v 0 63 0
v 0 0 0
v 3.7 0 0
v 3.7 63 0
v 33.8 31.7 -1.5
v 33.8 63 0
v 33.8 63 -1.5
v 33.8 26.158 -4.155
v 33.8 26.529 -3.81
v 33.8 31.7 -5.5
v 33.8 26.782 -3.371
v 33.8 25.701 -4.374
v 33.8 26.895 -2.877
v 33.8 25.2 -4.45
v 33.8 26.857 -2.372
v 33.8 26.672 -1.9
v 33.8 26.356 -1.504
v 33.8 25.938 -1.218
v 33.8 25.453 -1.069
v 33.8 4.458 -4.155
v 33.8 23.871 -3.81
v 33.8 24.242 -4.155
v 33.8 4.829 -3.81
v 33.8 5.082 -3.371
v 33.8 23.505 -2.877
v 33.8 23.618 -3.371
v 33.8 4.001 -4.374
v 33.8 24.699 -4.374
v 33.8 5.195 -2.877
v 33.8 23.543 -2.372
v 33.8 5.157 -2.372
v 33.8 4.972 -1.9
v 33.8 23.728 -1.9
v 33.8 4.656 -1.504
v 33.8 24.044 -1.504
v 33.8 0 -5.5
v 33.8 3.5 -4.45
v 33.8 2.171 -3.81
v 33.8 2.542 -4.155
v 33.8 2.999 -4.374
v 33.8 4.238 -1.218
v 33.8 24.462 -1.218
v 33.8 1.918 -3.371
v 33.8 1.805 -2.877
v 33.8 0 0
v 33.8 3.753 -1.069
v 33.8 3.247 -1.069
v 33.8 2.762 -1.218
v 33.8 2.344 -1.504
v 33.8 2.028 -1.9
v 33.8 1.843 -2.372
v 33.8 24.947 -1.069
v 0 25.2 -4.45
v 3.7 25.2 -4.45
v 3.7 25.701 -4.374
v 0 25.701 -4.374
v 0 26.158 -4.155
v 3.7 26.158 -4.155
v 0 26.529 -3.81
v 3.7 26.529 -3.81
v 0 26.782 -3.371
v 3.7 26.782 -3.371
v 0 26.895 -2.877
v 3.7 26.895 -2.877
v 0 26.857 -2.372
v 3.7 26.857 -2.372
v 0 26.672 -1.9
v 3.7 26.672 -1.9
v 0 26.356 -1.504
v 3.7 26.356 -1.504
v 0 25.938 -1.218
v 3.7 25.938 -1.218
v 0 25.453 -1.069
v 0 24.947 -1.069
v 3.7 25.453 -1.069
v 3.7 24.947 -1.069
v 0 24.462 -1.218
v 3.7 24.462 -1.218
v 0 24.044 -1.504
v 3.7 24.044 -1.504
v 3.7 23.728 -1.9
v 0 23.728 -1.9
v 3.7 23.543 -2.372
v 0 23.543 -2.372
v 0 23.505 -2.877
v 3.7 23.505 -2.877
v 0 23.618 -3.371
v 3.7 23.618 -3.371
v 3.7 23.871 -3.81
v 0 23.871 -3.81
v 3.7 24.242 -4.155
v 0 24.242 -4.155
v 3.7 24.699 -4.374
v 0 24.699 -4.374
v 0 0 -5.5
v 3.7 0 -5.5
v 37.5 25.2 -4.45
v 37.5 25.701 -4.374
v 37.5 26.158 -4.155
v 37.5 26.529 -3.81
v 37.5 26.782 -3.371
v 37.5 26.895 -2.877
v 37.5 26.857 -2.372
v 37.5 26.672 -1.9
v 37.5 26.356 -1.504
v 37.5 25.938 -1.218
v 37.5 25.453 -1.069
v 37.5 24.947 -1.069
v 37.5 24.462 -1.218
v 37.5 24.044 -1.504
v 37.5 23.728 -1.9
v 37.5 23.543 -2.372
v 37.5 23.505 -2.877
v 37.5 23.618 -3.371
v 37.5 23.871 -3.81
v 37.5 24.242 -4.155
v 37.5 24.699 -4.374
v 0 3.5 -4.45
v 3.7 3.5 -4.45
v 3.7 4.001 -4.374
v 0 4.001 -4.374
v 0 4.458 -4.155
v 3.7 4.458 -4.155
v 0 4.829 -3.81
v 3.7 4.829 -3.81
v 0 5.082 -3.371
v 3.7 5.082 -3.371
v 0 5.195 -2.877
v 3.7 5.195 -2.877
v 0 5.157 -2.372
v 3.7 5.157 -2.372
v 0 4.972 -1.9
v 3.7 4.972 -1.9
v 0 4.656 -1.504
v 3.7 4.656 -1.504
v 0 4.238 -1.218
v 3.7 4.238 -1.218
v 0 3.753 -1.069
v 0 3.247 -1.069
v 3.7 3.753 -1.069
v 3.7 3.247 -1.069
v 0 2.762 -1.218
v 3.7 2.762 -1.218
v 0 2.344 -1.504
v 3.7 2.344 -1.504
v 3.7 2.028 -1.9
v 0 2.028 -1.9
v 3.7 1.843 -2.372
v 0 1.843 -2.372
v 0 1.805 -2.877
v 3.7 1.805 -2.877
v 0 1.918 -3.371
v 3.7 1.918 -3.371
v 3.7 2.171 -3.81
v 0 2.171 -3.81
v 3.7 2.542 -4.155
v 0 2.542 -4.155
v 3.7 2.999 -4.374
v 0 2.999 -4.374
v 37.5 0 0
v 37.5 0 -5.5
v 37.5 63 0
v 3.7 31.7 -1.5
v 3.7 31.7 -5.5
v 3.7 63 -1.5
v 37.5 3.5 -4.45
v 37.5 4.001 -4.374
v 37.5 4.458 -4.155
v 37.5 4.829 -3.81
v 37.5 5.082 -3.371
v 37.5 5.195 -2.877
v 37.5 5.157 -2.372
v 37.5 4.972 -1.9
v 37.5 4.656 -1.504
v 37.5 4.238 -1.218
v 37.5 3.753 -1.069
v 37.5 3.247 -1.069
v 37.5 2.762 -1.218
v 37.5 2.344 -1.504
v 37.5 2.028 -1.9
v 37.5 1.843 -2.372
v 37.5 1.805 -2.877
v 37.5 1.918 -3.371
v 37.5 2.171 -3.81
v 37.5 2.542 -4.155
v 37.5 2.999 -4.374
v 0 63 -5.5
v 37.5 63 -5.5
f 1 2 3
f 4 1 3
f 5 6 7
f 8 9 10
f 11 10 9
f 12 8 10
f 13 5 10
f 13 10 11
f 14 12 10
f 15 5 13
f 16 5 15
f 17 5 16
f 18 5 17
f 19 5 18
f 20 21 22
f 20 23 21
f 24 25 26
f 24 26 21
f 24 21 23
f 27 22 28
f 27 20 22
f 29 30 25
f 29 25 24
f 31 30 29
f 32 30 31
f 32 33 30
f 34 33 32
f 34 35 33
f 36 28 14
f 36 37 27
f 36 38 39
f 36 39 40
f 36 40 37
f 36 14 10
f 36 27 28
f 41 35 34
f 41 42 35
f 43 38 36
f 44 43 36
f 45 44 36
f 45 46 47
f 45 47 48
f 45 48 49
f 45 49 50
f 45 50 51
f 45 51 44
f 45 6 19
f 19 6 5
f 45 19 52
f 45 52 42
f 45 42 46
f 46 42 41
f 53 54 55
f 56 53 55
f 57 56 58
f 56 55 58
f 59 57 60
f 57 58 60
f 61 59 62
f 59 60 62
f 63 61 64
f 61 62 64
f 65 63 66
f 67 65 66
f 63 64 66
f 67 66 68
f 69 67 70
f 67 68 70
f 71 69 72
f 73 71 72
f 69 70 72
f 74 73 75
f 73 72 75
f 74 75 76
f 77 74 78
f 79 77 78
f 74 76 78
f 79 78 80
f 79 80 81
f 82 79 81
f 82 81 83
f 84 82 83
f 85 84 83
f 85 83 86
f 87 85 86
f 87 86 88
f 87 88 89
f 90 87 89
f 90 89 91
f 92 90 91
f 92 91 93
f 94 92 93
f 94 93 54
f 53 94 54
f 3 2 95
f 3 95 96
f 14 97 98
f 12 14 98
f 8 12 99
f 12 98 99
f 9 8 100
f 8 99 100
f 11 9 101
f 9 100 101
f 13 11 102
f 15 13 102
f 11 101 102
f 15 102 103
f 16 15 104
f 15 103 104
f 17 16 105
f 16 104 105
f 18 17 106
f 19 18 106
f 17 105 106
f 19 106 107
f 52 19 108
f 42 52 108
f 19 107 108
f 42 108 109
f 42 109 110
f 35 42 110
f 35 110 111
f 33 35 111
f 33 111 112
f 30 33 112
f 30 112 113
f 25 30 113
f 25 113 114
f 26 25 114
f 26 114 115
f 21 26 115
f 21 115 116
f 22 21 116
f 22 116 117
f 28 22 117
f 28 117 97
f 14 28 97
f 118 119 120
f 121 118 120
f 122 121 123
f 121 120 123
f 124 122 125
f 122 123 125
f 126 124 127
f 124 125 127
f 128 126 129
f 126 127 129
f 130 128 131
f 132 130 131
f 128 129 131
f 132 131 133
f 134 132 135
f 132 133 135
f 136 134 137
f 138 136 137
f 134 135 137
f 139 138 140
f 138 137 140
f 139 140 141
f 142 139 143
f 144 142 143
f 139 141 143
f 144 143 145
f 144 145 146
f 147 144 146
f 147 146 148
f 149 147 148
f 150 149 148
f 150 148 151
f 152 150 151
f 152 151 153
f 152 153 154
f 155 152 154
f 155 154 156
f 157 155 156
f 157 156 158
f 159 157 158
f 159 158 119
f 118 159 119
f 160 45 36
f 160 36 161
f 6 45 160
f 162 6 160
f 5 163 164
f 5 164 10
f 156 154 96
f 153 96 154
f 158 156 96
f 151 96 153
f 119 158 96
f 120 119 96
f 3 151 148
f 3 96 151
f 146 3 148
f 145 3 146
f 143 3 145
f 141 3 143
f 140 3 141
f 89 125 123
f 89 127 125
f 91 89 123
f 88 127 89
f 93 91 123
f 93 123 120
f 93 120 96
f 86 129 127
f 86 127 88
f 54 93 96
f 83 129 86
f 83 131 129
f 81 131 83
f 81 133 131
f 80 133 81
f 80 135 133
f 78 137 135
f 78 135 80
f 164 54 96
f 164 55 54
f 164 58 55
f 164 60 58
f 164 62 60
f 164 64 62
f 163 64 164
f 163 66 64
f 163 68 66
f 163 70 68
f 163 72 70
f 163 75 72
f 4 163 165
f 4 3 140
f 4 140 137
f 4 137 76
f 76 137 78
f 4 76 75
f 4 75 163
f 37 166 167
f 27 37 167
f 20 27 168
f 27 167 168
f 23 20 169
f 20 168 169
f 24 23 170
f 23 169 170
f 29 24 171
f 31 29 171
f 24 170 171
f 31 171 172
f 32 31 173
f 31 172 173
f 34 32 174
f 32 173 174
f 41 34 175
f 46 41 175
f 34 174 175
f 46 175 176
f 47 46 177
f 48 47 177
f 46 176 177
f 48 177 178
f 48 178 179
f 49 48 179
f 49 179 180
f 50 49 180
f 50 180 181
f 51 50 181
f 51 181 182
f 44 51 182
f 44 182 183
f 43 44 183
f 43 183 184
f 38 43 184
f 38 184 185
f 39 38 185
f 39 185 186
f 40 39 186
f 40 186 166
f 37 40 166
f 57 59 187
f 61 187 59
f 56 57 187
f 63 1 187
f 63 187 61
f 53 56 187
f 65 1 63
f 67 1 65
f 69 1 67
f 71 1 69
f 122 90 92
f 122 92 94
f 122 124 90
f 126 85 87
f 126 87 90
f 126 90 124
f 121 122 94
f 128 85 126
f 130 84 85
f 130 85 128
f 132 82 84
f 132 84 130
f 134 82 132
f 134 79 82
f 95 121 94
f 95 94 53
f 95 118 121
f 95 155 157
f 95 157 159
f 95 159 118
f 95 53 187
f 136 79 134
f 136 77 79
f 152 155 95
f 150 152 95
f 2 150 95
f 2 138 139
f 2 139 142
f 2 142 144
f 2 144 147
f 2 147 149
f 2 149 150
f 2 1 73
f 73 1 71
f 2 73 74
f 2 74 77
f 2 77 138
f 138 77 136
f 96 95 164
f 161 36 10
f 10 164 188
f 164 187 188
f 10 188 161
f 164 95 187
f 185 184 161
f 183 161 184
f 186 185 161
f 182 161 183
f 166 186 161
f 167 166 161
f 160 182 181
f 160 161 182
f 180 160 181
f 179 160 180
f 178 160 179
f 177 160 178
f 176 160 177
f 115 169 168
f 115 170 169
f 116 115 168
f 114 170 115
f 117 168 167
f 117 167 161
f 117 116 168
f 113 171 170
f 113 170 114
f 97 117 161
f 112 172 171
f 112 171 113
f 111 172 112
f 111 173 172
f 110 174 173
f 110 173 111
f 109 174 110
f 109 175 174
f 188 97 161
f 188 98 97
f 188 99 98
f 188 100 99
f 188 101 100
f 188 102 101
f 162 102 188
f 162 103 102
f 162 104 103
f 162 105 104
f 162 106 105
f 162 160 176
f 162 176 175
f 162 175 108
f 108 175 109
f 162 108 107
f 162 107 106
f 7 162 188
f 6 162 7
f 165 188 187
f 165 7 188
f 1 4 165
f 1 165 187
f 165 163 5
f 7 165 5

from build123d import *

# Parameters (mm, degrees)
BOSS_EXTRUDE1_DEPTH = 5.5
SKETCH2_W           = 30.1
SKETCH2_H           = 31.3
CUT_EXTRUDE1_DEPTH  = 1.5
SKETCH3_R           = 1.7
CUT_EXTRUDE2_DEPTH  = 38.5


with BuildPart() as part:
    # Sketch1 → Boss-Extrude1 (new body)
    with BuildSketch(Plane.XY):
        Polygon((33.8, 0), (37.5, 0), (37.5, 63), (0, 63), (0, 0), (3.7, 0), (3.7, 31.7), (33.8, 31.7), align=None)
    extrude(amount=-BOSS_EXTRUDE1_DEPTH)

    # Sketch2 → Cut-Extrude1 (cut)
    with BuildSketch(Plane.XY):
        with Locations((18.75, 47.35)):
            Rectangle(SKETCH2_W, SKETCH2_H)
    extrude(amount=-CUT_EXTRUDE1_DEPTH, mode=Mode.SUBTRACT)

    # Sketch3 → Cut-Extrude2 (cut, through all)
    with BuildSketch(Plane(origin=(37.5, 0, 0), x_dir=(0, 0, -1), z_dir=(1, 0, 0))):
        with Locations((2.75, 3.5)):
            Circle(SKETCH3_R)
        with Locations((2.75, 25.2)):
            Circle(SKETCH3_R)
    extrude(amount=-CUT_EXTRUDE2_DEPTH, mode=Mode.SUBTRACT)


solid = part.part
